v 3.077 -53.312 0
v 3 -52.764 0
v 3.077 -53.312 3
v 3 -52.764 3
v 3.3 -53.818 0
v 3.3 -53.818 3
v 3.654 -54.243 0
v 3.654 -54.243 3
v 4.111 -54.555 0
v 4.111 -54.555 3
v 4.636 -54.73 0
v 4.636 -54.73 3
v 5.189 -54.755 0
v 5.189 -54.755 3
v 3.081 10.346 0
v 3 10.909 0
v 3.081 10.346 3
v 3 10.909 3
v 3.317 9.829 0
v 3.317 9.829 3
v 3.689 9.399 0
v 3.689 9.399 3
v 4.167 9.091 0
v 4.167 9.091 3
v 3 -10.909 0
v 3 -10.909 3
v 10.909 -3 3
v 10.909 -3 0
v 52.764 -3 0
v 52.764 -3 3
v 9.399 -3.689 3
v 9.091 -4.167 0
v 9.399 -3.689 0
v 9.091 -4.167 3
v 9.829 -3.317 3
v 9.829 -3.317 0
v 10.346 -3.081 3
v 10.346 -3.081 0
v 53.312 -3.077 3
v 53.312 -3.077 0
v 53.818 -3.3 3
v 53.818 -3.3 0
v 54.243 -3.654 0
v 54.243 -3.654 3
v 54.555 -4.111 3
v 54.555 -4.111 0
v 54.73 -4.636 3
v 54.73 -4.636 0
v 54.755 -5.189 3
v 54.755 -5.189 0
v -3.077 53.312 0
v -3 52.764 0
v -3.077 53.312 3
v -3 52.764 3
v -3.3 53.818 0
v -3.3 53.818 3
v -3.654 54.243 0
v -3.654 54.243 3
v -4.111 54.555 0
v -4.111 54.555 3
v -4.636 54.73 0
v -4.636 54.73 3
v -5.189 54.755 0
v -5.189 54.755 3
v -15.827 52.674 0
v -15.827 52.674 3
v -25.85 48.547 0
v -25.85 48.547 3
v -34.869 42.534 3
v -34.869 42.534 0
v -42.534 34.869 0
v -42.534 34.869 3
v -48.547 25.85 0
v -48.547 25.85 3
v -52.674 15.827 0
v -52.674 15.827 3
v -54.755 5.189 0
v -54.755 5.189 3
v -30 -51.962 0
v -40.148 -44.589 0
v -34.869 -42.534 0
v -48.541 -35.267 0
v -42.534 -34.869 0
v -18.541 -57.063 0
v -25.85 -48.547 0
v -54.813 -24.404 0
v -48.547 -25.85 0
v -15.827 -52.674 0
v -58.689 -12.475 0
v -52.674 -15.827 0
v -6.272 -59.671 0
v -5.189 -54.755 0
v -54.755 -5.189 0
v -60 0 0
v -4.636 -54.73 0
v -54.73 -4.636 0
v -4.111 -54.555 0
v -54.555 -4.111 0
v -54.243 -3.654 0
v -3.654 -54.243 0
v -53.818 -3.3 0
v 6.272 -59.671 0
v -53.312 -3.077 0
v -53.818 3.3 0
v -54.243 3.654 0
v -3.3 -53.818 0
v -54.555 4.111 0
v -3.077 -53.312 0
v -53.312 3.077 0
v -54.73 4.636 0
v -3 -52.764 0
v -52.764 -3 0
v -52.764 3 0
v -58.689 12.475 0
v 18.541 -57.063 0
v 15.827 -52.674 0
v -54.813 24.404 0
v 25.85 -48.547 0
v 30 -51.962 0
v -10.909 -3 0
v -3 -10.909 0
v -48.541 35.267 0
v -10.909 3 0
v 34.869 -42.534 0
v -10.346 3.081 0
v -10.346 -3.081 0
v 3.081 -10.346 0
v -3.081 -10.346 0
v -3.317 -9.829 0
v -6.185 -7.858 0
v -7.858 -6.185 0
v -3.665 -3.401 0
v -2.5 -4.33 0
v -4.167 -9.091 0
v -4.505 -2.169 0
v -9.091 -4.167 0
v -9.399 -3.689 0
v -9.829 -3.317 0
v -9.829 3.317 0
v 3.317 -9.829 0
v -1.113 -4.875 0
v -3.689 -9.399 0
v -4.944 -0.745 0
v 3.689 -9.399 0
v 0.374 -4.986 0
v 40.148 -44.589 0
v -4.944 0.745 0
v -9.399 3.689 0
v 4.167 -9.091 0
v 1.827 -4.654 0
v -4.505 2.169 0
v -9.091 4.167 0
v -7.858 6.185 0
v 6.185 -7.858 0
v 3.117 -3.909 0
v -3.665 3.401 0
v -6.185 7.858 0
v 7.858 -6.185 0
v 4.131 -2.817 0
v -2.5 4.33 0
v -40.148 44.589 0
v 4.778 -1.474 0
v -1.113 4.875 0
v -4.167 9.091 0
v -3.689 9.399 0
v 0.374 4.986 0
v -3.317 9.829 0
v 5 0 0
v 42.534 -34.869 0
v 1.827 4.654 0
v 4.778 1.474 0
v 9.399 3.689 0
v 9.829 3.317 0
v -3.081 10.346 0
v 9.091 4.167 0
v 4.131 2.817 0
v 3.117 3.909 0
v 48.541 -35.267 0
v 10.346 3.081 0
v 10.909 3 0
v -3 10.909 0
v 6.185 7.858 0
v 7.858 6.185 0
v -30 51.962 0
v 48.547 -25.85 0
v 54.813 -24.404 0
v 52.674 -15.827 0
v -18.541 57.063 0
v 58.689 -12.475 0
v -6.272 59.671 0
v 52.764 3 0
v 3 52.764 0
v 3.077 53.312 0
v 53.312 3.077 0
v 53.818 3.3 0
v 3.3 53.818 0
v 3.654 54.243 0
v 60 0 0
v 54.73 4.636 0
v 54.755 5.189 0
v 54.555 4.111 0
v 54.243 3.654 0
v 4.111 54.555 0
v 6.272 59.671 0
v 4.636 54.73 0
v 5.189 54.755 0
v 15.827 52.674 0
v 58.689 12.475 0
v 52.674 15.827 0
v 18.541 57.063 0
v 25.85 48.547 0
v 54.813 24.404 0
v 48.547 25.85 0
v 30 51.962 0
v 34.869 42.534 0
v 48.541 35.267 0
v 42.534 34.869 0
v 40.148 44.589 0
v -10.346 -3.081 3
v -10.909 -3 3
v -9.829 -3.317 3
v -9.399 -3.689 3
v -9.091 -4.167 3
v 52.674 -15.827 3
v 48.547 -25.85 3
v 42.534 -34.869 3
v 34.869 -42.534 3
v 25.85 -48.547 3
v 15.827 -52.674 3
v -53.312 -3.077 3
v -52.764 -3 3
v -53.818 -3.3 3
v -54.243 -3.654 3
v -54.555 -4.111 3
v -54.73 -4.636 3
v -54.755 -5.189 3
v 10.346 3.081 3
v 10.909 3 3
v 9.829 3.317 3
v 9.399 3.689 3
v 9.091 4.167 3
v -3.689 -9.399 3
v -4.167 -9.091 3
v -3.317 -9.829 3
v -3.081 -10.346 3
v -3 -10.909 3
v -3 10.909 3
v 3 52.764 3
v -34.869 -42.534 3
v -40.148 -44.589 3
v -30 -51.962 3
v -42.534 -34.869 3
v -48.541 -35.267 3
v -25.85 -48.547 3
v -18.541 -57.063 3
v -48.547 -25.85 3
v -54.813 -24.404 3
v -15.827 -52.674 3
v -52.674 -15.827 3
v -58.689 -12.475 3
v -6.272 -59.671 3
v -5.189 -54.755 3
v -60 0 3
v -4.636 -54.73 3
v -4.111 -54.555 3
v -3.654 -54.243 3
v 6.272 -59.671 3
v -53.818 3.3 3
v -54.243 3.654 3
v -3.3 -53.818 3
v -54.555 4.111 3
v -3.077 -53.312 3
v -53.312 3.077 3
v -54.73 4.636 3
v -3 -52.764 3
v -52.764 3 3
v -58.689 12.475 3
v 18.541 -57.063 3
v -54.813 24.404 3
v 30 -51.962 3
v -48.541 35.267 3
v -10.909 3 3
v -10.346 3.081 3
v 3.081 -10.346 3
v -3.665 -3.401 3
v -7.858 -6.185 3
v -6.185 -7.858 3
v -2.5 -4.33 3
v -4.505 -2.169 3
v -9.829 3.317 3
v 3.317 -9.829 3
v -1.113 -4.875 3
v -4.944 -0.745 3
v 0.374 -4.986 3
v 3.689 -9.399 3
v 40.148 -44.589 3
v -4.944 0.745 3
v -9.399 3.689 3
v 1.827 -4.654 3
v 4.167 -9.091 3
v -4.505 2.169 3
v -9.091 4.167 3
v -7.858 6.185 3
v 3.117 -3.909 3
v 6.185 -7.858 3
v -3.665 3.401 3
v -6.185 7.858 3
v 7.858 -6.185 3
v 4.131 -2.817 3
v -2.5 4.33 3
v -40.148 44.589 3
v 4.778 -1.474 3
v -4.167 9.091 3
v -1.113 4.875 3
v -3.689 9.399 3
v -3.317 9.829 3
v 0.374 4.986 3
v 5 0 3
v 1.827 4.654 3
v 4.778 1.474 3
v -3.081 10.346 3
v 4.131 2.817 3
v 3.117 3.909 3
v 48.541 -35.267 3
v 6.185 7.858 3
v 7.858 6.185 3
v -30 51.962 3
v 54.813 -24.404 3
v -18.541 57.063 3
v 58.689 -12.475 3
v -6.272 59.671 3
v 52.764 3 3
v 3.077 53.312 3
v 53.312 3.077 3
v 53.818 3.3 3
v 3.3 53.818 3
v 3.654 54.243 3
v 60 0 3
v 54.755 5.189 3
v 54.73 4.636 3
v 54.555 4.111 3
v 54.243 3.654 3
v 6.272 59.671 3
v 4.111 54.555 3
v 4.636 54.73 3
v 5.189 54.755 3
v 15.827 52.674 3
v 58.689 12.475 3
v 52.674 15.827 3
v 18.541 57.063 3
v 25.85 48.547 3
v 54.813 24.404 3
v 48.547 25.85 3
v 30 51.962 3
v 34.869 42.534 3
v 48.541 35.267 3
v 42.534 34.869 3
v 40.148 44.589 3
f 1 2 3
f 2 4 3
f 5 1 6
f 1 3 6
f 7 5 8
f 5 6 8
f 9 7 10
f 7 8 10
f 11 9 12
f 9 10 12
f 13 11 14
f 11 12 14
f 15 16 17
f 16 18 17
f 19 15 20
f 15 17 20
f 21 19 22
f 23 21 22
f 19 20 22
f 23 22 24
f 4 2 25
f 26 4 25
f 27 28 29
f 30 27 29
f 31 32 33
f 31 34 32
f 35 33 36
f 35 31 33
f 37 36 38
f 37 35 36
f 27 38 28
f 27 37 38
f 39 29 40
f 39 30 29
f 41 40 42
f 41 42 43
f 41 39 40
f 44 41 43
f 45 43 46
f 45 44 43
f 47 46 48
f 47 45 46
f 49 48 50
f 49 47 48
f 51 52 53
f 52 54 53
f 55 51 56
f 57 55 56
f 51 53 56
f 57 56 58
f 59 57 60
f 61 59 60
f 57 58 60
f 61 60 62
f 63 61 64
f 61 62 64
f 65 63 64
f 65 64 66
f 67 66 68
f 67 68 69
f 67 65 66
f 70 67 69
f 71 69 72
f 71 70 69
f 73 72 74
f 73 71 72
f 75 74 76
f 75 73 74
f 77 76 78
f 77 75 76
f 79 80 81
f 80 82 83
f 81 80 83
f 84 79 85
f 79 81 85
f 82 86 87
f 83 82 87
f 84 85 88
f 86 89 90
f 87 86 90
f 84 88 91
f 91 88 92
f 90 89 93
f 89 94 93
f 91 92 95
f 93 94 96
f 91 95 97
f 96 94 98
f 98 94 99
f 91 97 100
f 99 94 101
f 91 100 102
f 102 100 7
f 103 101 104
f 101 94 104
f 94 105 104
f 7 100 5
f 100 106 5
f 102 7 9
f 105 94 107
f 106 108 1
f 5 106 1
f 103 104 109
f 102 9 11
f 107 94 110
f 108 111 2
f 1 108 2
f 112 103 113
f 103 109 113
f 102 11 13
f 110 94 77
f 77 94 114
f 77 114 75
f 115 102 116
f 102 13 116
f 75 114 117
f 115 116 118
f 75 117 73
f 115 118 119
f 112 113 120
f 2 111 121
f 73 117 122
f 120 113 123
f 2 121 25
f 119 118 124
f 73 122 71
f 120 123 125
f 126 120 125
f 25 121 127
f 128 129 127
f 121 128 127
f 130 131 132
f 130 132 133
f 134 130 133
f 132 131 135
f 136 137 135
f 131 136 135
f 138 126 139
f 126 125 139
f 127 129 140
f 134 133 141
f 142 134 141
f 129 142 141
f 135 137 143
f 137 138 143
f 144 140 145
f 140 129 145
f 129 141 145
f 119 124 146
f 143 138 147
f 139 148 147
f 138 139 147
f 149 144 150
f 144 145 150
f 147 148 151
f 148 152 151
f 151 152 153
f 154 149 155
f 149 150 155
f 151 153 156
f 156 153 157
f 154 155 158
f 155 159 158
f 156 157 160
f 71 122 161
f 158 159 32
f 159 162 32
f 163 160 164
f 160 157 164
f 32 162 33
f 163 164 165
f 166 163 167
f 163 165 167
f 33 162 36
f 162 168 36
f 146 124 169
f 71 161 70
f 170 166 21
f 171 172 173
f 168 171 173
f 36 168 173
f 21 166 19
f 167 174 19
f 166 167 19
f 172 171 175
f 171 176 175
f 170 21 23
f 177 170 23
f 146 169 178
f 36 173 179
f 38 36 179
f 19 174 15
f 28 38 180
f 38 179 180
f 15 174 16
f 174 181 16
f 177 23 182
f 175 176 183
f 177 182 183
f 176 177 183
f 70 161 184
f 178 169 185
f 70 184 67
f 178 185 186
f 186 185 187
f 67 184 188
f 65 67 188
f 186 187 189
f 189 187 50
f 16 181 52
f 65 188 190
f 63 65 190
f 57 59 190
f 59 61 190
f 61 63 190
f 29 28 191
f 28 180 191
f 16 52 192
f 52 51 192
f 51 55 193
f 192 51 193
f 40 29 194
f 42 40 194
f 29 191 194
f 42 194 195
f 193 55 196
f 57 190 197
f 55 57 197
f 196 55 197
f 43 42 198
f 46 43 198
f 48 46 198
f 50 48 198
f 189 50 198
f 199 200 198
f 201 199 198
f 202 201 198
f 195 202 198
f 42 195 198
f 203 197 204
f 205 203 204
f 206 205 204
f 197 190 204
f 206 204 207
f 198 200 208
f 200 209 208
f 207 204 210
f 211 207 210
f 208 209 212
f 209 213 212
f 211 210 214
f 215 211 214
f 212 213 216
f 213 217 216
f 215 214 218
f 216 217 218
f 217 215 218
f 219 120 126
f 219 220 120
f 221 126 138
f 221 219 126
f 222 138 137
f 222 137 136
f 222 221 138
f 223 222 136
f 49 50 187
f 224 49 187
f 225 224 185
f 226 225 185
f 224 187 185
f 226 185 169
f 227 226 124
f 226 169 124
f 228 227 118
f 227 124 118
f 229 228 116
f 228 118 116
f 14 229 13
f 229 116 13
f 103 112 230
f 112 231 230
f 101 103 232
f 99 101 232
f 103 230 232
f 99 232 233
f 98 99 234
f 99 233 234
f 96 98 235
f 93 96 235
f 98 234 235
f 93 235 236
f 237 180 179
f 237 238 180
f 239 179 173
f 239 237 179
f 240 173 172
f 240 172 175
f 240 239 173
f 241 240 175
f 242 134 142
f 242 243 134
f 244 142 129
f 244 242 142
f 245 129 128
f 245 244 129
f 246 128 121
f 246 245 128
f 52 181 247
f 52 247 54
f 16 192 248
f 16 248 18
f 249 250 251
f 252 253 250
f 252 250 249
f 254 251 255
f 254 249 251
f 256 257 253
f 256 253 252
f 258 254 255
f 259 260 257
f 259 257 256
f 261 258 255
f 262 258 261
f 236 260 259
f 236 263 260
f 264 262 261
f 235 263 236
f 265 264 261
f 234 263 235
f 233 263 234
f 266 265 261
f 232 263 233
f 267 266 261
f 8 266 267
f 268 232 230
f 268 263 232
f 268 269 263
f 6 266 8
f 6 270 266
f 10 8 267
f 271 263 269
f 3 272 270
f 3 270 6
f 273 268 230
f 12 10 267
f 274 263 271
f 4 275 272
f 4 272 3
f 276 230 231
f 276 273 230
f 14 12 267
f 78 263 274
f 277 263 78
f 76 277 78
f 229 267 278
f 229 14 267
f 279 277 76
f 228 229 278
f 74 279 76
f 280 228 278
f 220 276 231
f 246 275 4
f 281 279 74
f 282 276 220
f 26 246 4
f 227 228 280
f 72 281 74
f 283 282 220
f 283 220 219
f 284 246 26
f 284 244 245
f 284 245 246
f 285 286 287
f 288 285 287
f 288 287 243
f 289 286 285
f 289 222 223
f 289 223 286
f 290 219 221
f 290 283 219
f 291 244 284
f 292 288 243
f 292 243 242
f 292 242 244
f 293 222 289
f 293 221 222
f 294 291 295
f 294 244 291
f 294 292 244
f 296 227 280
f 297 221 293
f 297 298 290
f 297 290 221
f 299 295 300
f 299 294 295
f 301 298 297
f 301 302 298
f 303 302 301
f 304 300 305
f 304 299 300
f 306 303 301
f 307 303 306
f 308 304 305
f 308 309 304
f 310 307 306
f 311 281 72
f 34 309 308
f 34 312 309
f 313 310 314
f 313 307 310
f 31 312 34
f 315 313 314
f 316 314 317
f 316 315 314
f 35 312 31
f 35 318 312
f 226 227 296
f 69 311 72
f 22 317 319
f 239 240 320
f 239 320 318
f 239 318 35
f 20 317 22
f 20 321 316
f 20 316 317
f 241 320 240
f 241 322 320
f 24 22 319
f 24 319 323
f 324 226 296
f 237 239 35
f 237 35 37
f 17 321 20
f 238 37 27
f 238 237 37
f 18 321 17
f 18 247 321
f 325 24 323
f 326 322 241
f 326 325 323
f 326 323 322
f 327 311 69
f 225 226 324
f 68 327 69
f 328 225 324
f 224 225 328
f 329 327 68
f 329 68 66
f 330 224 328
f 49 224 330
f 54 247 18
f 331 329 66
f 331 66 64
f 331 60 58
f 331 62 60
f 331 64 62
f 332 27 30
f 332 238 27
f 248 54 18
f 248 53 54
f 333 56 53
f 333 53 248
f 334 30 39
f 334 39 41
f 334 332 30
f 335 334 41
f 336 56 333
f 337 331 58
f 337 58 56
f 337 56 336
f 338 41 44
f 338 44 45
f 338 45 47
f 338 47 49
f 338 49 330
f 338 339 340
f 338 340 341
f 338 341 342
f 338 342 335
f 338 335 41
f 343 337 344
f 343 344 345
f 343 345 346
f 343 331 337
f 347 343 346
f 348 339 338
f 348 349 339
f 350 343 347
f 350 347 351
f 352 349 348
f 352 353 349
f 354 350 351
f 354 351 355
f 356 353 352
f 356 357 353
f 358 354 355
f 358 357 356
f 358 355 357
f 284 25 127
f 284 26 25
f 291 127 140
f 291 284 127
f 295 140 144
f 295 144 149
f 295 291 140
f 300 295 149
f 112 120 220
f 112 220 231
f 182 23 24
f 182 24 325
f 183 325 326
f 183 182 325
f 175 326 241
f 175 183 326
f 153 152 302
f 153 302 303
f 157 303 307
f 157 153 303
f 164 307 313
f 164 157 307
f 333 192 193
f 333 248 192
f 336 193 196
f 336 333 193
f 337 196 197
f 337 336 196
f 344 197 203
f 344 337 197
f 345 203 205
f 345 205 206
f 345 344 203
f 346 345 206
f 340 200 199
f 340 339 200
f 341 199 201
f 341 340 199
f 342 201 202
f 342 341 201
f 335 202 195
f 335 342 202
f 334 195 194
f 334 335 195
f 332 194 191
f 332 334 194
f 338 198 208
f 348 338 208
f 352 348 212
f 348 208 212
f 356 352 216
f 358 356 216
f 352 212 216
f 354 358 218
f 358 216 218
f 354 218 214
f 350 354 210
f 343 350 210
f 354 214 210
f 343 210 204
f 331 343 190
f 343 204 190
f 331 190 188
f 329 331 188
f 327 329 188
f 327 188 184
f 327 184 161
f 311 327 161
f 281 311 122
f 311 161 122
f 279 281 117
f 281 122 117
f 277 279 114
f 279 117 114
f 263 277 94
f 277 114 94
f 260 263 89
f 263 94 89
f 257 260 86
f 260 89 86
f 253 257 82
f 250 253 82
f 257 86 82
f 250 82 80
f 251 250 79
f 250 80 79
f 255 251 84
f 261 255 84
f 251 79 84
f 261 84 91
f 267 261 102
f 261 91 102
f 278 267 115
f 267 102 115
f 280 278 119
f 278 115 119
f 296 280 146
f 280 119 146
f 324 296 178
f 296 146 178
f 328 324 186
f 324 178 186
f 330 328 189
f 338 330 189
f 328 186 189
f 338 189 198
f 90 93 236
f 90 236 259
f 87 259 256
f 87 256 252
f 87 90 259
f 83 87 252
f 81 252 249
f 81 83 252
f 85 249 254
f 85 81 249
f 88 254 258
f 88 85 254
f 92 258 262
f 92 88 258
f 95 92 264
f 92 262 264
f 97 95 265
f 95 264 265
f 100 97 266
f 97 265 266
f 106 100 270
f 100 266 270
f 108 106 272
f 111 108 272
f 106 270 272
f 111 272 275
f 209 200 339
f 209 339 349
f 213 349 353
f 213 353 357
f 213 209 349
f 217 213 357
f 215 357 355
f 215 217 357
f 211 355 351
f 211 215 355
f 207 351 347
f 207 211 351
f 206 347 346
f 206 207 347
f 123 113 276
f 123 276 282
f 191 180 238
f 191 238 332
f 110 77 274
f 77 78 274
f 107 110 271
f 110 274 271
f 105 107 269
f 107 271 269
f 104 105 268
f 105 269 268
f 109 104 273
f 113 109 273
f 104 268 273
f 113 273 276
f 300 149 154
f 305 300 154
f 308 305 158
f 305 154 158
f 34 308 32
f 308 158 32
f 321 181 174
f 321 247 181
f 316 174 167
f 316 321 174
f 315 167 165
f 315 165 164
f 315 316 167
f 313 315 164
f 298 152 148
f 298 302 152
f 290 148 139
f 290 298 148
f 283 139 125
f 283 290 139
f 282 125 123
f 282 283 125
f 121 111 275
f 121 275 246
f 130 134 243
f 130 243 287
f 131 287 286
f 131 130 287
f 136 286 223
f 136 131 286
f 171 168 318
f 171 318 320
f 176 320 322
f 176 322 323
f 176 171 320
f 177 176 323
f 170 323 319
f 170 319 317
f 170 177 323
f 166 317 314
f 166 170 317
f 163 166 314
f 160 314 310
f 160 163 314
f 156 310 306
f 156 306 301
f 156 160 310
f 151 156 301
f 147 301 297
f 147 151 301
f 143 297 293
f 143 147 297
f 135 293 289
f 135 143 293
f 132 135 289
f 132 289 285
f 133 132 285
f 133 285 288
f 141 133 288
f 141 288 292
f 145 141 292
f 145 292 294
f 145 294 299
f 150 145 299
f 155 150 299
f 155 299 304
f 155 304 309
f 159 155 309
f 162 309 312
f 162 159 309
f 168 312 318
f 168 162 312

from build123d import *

# Parameters (mm, degrees)
SKETCH_1_R      = 60
SKETCH_1_R_2    = 5
EXTRUDE_1_DEPTH = 3
FILLET_1_R      = 2
FILLET_2_R      = 2
FILLET_4_R      = 2


with BuildPart() as part:
    # 草图1 → 凸台-拉伸1 (new body)
    with BuildSketch(Plane.XY):
        Circle(SKETCH_1_R)
        Circle(SKETCH_1_R_2, mode=Mode.SUBTRACT)
        with BuildLine():
            Line((3, 54.918120871), (3, 9.539392014))
            ThreePointArc((3, 9.539392014), (7.071067812, 7.071067812), (9.539392014, 3))
            Line((9.539392014, 3), (54.918120871, 3))
            ThreePointArc((54.918120871, 3), (38.890872965, 38.890872965), (3, 54.918120871))
        make_face(mode=Mode.SUBTRACT)
        with BuildLine():
            Line((-9.539392014, -3), (-54.918120871, -3))
            ThreePointArc((-54.918120871, -3), (-38.890872965, -38.890872965), (-3, -54.918120871))
            Line((-3, -54.918120871), (-3, -9.539392014))
            ThreePointArc((-3, -9.539392014), (-7.071067812, -7.071067812), (-9.539392014, -3))
        make_face(mode=Mode.SUBTRACT)
        with BuildLine():
            Line((9.539392014, -3), (54.918120871, -3))
            ThreePointArc((54.918120871, -3), (38.890872965, -38.890872965), (3, -54.918120871))
            Line((3, -54.918120871), (3, -9.539392014))
            ThreePointArc((3, -9.539392014), (7.071067812, -7.071067812), (9.539392014, -3))
        make_face(mode=Mode.SUBTRACT)
        with BuildLine():
            Line((-3, 9.539392014), (-3, 54.918120871))
            ThreePointArc((-3, 54.918120871), (-38.890872965, 38.890872965), (-54.918120871, 3))
            Line((-54.918120871, 3), (-9.539392014, 3))
            ThreePointArc((-9.539392014, 3), (-7.071067812, 7.071067812), (-3, 9.539392014))
        make_face(mode=Mode.SUBTRACT)
    extrude(amount=EXTRUDE_1_DEPTH)

    # 圆角1
    fillet_1_edges = [part.edges().sort_by_distance(p)[0] for p in [
        (3, 54.918120871, 1.5),
    ]]
    fillet(fillet_1_edges, radius=FILLET_1_R)

    # 圆角2
    fillet_2_edges = [part.edges().sort_by_distance(p)[0] for p in [
        (54.918120871, 3, 1.5),
        (3, -54.918120871, 1.5),
        (54.918120871, -3, 1.5),
        (-54.918120871, -3, 1.5),
        (-3, -54.918120871, 1.5),
        (-3, 54.918120871, 1.5),
        (-54.918120871, 3, 1.5),
    ]]
    fillet(fillet_2_edges, radius=FILLET_2_R)

    # 圆角4
    fillet_4_edges = [part.edges().sort_by_distance(p)[0] for p in [
        (3, 9.539392014, 1.5),
        (9.539392014, 3, 1.5),
        (9.539392014, -3, 1.5),
        (3, -9.539392014, 1.5),
        (-3, -9.539392014, 1.5),
        (-9.539392014, -3, 1.5),
        (-9.539392014, 3, 1.5),
        (-3, 9.539392014, 1.5),
    ]]
    fillet(fillet_4_edges, radius=FILLET_4_R)


solid = part.part
